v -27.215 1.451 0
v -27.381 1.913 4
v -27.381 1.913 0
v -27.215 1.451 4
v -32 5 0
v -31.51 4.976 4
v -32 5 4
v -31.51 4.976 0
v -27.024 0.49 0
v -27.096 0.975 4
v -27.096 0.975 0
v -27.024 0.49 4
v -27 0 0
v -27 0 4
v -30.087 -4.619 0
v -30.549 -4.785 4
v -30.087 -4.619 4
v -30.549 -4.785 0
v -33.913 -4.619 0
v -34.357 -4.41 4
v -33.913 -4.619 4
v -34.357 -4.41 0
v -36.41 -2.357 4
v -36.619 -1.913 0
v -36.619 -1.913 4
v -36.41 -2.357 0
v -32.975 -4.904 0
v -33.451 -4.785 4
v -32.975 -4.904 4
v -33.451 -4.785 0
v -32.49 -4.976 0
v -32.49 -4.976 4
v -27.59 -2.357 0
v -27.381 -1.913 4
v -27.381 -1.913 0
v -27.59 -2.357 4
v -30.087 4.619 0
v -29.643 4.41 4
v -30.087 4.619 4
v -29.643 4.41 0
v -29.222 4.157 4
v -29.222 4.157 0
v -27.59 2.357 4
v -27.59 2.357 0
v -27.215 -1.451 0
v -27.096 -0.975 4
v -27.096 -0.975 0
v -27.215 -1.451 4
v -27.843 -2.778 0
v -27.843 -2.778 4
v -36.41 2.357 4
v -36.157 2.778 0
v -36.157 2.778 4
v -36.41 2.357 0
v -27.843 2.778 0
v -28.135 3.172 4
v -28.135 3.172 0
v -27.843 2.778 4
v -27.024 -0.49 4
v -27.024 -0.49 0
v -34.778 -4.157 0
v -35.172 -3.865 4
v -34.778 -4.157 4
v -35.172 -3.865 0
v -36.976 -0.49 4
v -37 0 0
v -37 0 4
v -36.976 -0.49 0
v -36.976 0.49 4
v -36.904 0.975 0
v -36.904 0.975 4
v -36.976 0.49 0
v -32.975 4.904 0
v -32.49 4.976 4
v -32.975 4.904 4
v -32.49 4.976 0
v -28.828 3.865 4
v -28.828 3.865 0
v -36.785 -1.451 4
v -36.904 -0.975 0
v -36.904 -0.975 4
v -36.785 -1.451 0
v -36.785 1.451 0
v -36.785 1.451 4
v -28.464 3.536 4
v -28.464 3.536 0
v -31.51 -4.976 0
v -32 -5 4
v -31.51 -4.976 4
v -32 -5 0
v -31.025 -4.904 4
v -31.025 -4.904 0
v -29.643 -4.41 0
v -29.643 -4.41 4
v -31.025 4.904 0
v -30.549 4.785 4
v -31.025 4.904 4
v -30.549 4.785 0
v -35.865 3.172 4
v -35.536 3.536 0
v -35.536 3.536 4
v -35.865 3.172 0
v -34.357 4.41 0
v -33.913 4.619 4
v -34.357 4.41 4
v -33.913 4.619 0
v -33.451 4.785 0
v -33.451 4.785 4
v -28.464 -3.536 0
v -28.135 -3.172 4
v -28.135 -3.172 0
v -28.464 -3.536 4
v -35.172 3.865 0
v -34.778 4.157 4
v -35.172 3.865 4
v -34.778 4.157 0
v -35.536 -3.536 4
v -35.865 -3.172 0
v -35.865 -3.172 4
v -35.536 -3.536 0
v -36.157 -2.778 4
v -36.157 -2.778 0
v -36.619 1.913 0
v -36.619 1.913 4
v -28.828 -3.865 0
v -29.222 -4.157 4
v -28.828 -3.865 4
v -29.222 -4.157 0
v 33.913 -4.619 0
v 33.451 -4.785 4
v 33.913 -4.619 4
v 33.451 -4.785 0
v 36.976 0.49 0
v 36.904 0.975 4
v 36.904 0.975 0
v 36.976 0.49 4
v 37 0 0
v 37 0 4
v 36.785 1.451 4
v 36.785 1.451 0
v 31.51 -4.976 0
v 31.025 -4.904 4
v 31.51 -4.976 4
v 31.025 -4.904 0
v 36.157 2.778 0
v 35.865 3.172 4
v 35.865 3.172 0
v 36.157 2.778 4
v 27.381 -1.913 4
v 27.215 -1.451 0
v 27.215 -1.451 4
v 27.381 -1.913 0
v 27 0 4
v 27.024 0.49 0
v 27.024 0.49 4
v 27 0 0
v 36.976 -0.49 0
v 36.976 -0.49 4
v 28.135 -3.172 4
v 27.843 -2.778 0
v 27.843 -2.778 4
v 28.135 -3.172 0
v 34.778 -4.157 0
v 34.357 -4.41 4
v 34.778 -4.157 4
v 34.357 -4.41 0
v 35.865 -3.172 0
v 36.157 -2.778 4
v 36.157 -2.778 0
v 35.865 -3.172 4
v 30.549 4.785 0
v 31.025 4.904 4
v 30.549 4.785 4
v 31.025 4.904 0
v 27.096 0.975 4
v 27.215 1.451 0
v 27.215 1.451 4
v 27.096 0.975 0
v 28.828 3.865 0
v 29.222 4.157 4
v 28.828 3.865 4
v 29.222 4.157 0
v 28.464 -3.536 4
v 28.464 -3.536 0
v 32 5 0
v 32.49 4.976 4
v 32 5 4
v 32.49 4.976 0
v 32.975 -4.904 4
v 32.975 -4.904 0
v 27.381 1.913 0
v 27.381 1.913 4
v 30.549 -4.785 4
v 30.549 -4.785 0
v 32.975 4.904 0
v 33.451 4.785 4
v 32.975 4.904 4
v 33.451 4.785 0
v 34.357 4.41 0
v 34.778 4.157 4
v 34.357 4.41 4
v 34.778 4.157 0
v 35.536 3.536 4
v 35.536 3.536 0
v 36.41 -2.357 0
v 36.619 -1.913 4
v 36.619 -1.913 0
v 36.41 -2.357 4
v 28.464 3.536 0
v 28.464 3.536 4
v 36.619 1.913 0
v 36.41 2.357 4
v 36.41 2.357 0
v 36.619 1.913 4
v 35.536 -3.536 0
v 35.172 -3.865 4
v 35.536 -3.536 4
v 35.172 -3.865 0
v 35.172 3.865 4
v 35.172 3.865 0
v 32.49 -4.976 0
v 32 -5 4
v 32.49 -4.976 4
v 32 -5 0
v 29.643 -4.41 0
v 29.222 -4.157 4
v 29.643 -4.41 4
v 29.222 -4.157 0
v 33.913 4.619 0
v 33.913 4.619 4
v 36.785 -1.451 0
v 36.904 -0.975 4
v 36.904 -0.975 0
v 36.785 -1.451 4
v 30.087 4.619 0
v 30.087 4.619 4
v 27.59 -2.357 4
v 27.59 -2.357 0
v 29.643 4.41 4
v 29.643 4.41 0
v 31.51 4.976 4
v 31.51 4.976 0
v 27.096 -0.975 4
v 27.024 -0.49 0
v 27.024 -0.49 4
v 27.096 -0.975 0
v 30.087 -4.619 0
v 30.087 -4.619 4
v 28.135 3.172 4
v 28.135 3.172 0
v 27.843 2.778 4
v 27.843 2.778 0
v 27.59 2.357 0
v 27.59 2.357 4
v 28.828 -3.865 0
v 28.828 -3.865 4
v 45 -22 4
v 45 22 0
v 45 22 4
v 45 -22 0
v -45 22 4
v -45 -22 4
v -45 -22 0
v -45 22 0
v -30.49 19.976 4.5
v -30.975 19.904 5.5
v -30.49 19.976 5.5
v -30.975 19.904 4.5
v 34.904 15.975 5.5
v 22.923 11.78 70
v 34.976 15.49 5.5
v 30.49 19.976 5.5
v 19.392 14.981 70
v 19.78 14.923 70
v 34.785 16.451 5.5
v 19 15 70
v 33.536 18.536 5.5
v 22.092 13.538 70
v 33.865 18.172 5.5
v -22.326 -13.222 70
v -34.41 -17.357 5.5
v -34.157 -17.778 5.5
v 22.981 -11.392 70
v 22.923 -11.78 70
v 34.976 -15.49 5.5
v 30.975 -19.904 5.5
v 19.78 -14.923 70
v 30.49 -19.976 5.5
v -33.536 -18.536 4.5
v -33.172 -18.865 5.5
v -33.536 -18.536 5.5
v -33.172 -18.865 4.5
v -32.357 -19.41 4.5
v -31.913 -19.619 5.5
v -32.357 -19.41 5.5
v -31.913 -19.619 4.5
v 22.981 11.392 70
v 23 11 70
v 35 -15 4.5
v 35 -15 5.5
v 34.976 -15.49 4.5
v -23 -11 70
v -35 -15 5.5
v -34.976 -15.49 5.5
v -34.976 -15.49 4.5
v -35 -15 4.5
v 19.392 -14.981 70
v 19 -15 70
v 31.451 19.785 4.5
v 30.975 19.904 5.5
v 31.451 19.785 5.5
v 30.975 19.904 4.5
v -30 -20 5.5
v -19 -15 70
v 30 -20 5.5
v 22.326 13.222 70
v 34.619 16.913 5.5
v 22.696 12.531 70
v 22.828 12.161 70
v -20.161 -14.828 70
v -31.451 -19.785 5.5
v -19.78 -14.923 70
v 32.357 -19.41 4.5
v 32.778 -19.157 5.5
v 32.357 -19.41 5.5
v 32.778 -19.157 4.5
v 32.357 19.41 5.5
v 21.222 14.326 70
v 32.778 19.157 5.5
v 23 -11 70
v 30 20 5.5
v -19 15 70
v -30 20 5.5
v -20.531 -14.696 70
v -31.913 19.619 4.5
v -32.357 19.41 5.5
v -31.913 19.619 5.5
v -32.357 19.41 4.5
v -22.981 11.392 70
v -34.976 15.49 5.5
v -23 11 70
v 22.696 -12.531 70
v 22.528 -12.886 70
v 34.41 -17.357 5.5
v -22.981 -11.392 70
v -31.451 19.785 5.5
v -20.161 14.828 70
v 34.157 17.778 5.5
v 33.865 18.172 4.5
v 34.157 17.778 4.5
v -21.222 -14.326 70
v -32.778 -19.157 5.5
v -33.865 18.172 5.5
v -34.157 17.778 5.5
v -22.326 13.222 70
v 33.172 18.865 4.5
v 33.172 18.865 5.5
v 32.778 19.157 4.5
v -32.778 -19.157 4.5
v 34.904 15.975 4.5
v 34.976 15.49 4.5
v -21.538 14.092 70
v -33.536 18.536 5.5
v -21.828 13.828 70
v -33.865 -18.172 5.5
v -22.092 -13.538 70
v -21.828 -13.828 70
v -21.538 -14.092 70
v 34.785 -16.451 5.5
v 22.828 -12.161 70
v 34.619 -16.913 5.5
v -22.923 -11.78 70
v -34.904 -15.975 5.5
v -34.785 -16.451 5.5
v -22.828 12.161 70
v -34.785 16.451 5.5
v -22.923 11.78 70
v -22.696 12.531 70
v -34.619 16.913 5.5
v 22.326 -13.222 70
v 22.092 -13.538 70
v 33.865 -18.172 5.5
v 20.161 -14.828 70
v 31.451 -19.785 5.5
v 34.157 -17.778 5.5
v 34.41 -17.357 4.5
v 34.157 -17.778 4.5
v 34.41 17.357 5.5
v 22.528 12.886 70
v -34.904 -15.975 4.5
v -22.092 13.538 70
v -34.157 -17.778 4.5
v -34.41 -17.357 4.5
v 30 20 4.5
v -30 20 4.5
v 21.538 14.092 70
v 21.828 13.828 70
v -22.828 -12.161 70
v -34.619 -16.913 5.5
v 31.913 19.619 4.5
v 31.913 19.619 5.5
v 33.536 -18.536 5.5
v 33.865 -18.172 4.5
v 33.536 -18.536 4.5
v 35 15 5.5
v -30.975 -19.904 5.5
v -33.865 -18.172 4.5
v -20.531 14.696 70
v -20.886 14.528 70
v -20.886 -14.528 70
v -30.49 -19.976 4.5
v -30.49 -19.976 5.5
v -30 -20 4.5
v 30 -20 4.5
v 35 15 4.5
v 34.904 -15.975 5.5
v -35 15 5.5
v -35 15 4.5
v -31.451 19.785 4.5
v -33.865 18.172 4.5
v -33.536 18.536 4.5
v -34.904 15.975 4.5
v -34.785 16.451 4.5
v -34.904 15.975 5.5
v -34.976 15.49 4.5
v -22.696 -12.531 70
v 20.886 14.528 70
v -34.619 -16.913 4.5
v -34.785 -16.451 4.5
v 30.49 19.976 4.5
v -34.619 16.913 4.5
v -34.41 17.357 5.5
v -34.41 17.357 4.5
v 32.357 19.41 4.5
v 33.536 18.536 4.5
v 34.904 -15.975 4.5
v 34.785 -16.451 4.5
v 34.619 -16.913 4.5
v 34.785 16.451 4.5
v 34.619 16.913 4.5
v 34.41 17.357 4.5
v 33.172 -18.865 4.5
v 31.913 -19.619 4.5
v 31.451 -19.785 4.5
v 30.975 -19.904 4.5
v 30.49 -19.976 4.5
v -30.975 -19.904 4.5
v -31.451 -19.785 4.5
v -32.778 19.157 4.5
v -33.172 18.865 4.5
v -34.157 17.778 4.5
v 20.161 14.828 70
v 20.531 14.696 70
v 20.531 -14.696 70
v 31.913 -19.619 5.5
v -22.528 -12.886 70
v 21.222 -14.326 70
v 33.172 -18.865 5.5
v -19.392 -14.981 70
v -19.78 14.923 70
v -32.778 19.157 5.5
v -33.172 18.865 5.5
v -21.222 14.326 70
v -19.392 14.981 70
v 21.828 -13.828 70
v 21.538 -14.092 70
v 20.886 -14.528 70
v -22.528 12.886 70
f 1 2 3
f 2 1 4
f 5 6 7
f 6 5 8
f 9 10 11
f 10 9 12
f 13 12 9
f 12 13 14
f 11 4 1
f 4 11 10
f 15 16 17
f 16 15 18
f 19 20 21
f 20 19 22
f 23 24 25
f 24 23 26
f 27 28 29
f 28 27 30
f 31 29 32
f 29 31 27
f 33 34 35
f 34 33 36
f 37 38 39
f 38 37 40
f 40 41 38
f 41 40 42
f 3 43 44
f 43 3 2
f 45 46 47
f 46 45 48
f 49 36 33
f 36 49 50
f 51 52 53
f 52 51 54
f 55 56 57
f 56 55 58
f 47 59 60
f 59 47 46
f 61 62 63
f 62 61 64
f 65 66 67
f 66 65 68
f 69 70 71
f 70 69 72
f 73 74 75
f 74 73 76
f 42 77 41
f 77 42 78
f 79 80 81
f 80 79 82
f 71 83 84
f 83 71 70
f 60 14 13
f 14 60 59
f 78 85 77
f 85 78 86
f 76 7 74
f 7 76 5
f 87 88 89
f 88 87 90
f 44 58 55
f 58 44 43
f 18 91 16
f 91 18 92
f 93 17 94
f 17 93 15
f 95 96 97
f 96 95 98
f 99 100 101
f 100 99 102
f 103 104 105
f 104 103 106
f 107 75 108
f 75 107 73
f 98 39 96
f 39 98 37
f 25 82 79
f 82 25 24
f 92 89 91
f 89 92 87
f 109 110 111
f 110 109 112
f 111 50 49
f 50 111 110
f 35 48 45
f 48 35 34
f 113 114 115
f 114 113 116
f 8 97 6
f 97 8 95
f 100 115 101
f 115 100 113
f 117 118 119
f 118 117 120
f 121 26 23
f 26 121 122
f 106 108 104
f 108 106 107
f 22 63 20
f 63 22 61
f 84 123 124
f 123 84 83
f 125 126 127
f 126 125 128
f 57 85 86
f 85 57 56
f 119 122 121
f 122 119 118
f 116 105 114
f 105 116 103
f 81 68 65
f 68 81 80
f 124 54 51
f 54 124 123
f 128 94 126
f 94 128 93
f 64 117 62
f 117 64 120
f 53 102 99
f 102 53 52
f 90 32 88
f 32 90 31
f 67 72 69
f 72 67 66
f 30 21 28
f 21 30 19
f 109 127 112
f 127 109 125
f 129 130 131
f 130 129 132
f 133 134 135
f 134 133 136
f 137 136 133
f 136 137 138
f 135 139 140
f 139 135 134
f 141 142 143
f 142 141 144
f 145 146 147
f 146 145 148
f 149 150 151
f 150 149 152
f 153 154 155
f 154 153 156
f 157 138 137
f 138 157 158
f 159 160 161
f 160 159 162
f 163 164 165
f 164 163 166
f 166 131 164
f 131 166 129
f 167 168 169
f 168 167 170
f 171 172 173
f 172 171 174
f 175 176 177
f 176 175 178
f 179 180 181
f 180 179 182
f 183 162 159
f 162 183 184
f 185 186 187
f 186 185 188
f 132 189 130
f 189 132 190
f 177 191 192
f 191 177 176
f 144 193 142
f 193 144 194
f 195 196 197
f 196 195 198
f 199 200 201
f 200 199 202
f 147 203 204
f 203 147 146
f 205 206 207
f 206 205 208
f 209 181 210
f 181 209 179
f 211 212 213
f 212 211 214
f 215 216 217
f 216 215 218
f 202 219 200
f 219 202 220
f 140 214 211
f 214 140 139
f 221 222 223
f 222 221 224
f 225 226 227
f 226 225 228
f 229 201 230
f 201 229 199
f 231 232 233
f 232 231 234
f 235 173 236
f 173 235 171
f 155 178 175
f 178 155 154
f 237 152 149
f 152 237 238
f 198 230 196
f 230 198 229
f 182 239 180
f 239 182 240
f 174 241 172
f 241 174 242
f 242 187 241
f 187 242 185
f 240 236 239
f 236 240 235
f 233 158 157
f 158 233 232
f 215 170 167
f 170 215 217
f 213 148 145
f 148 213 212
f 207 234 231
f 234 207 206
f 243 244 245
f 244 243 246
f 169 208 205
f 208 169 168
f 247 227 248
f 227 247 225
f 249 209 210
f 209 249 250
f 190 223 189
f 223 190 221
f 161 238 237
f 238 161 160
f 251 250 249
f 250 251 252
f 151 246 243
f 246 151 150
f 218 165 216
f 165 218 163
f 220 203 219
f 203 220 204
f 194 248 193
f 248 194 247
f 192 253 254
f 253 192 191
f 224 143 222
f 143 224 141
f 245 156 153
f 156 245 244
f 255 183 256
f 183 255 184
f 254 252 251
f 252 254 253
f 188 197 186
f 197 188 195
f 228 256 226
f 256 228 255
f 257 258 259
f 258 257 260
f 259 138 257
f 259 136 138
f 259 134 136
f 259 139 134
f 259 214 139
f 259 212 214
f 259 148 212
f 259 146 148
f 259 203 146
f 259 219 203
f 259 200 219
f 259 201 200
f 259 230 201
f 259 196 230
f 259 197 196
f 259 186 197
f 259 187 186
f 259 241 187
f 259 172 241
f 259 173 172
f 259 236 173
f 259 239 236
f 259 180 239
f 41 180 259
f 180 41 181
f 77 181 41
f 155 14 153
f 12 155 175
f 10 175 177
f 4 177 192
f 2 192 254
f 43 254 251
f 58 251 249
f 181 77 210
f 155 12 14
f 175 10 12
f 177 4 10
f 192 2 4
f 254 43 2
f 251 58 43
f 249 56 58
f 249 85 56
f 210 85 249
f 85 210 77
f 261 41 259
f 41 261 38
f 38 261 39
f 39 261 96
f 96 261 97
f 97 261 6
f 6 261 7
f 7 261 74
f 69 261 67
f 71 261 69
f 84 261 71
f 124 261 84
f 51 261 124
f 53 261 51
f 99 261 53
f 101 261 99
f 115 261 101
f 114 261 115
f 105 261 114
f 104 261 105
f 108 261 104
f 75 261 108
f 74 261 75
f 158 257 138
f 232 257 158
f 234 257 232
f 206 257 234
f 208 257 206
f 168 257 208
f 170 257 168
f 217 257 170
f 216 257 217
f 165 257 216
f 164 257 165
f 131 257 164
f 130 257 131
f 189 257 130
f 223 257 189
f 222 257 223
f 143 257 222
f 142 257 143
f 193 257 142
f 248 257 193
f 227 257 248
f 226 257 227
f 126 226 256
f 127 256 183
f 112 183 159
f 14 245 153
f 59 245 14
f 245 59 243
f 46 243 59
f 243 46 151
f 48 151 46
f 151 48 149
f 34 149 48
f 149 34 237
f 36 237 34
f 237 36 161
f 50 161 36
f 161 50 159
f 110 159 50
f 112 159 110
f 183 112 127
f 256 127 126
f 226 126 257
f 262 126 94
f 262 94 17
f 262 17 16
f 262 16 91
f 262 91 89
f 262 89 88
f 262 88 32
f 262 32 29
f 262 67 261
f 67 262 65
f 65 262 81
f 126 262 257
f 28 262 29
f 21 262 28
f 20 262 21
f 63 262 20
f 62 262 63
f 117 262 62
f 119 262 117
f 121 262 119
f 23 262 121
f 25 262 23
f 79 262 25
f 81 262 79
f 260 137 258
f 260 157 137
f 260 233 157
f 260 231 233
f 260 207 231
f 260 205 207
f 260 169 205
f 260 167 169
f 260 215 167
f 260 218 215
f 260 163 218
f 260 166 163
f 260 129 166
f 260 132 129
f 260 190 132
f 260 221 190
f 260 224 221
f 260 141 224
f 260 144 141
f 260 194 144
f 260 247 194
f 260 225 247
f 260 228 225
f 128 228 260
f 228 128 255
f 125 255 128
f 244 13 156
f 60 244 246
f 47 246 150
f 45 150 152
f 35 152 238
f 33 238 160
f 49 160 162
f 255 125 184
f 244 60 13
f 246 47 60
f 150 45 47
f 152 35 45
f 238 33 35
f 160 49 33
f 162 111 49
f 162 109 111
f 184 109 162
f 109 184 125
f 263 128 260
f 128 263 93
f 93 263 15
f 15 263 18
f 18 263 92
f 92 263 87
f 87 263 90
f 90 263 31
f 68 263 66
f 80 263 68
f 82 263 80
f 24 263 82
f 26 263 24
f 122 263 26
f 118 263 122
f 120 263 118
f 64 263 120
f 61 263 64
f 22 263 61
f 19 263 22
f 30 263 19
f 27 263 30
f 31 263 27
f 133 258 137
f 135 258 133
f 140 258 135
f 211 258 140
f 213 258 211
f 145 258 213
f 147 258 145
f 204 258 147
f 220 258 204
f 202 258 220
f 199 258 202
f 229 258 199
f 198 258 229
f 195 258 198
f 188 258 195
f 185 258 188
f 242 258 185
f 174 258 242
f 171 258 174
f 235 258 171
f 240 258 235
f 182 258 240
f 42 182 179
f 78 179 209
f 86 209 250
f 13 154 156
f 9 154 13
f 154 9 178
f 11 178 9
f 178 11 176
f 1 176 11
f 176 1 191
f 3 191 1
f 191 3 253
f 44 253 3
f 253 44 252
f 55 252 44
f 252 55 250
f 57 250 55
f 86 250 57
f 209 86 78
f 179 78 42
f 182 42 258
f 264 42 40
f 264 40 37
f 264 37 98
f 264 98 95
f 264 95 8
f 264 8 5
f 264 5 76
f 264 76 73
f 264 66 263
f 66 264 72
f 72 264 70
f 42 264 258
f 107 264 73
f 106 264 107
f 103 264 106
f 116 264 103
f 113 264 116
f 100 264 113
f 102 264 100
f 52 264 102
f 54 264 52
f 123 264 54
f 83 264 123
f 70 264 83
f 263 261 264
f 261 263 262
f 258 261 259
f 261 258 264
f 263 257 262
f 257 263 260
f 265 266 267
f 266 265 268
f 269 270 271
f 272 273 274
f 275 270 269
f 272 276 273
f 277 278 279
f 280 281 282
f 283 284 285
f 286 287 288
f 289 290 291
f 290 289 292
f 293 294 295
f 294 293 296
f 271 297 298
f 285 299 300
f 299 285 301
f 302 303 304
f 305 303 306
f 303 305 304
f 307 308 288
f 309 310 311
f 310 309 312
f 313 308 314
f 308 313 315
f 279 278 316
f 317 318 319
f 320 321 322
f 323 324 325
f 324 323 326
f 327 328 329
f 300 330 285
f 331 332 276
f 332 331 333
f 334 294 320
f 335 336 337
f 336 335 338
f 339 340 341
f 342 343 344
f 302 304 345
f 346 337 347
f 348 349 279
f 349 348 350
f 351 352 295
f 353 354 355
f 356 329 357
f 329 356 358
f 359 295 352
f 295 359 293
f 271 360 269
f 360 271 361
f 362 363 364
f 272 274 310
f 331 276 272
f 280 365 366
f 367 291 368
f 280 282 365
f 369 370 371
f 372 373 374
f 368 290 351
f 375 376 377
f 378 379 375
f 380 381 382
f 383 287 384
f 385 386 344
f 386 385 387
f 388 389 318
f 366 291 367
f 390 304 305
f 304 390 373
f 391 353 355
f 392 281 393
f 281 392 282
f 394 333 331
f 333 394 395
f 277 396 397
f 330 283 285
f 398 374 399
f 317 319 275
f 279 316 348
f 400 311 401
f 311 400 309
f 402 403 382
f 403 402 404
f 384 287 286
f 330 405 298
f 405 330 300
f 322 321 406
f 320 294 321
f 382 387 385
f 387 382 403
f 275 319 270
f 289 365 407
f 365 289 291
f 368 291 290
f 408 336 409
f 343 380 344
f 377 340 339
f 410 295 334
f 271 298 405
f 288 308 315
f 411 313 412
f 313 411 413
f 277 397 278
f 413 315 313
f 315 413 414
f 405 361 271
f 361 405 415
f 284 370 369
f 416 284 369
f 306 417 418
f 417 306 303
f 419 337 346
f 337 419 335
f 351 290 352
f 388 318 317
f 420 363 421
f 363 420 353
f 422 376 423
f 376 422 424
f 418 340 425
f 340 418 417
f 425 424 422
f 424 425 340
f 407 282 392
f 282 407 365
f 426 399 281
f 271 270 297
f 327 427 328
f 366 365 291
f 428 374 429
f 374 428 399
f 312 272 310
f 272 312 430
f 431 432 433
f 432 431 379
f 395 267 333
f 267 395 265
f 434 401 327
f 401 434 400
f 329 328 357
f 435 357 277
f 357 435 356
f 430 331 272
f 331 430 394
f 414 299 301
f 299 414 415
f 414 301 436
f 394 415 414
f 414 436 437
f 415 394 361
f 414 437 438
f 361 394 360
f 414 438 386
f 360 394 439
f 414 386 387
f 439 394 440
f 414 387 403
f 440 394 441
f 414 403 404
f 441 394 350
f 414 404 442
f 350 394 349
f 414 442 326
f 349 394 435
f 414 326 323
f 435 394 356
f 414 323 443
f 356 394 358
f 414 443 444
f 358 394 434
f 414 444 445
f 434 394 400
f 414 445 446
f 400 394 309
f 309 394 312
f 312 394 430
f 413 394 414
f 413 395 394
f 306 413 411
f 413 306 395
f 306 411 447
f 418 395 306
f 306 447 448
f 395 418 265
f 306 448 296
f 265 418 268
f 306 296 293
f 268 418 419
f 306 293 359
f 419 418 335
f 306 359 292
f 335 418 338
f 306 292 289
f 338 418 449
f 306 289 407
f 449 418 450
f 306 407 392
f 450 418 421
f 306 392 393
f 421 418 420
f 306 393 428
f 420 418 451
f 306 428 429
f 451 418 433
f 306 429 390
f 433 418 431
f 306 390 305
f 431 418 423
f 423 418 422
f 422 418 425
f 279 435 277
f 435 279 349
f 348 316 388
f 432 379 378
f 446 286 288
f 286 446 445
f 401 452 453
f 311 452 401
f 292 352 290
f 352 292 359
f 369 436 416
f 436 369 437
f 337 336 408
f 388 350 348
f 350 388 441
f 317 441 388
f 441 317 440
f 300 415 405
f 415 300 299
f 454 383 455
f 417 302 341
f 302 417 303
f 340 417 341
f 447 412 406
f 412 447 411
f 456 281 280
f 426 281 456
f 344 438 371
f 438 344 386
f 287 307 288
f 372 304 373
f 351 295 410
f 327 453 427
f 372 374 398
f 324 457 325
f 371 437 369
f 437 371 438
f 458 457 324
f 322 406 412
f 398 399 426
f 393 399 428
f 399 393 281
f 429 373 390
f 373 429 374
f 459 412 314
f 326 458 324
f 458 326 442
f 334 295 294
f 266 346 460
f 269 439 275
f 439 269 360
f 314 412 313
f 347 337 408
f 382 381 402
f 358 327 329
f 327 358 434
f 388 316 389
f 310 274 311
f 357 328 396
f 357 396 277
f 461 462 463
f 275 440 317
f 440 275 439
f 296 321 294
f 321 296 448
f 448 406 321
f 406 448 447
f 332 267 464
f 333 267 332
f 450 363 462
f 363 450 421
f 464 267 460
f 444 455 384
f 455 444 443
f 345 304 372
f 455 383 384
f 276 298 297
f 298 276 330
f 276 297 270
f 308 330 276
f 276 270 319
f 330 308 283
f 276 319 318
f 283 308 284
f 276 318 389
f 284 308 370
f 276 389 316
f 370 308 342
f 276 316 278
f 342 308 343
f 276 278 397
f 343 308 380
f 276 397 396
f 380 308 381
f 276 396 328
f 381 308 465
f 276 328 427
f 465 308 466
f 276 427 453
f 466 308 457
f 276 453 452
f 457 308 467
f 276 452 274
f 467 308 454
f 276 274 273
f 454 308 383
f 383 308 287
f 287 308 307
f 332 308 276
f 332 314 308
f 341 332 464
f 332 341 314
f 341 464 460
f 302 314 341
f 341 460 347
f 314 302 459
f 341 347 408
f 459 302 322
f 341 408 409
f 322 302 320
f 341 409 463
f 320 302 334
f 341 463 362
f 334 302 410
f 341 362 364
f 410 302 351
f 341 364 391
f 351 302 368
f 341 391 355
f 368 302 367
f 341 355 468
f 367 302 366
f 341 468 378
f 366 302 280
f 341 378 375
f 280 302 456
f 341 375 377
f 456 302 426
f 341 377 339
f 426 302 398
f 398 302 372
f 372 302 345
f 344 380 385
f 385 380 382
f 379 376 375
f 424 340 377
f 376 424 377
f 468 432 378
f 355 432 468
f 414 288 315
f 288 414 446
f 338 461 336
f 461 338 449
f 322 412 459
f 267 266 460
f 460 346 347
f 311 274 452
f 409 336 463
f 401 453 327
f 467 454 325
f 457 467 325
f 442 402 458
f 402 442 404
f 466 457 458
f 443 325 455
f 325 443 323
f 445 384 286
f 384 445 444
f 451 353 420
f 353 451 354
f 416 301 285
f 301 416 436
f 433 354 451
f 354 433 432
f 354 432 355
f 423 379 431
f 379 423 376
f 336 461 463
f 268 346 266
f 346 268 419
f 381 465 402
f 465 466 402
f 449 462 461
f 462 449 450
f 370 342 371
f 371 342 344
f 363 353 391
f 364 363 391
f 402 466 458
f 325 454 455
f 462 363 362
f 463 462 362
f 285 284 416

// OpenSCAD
// BUMP-60010 long bump stop model, front-left and rear
// J40 rubber recreation 3D model, units: millimetres.
// Generated by tools/generate_rubber_recreation_3d_models.py.
// OpenSCAD is the source model; export STL only after release parameters are set.

$fn = 64;

module rounded_rect_2d(size, r) {
  hull() {
    translate([-(size[0] / 2 - r), -(size[1] / 2 - r)]) circle(r = r);
    translate([ (size[0] / 2 - r), -(size[1] / 2 - r)]) circle(r = r);
    translate([ (size[0] / 2 - r),  (size[1] / 2 - r)]) circle(r = r);
    translate([-(size[0] / 2 - r),  (size[1] / 2 - r)]) circle(r = r);
  }
}

module capsule_2d(length, width) {
  hull() {
    translate([-(length - width) / 2, 0]) circle(d = width);
    translate([ (length - width) / 2, 0]) circle(d = width);
  }
}

module chamfered_extrude(height, edge_chamfer = 0) {
  eps = 0.01;
  if (edge_chamfer <= 0) {
    linear_extrude(height = height, center = false)
      children();
  } else {
    union() {
      translate([0, 0, edge_chamfer])
        linear_extrude(height = height - (2 * edge_chamfer), center = false)
          children();

      hull() {
        translate([0, 0, 0])
          linear_extrude(height = eps, center = false)
            offset(delta = -edge_chamfer)
              children();
        translate([0, 0, edge_chamfer])
          linear_extrude(height = eps, center = false)
            children();
      }

      hull() {
        translate([0, 0, height - edge_chamfer])
          linear_extrude(height = eps, center = false)
            children();
        translate([0, 0, height - eps])
          linear_extrude(height = eps, center = false)
            offset(delta = -edge_chamfer)
              children();
      }
    }
  }
}

// Vehicle-measurement model:
// - Height is the known Toyota-family control.
// - Saddle length/width, bolt pitch, bolt diameter, and strike offset must come
//   from the cleaned vehicle bracket and axle strike pad.
// - Mounting holes are only in the steel saddle; do not add rubber through-holes
//   unless a genuine sample proves molded clearance holes.
// - This model is a first-article conversation shape, not a released mould.

module b_60010_long_measurement_model(
  free_height = 70,
  saddle_length = 90,
  saddle_width = 44,
  saddle_thickness = 4,
  bolt_pitch = 64,
  bolt_d = 10,
  top_length = 46,
  top_width = 30,
  rubber_base_length = 70,
  rubber_base_width = 40
) {
  color("silver")
    difference() {
      translate([0, 0, saddle_thickness / 2])
        cube([saddle_length, saddle_width, saddle_thickness], center = true);
      for (x = [-bolt_pitch / 2, bolt_pitch / 2])
        translate([x, 0, -1])
          cylinder(h = saddle_thickness + 2, d = bolt_d);
    }

  color("black")
    translate([0, 0, saddle_thickness])
      hull() {
        translate([0, 0, 0.5])
          linear_extrude(height = 1, center = false)
            rounded_rect_2d([rubber_base_length, rubber_base_width], 5);
        translate([0, 0, free_height - saddle_thickness - 1])
          linear_extrude(height = 1, center = false)
            rounded_rect_2d([top_length, top_width], 4);
      }
}

b_60010_long_measurement_model();
